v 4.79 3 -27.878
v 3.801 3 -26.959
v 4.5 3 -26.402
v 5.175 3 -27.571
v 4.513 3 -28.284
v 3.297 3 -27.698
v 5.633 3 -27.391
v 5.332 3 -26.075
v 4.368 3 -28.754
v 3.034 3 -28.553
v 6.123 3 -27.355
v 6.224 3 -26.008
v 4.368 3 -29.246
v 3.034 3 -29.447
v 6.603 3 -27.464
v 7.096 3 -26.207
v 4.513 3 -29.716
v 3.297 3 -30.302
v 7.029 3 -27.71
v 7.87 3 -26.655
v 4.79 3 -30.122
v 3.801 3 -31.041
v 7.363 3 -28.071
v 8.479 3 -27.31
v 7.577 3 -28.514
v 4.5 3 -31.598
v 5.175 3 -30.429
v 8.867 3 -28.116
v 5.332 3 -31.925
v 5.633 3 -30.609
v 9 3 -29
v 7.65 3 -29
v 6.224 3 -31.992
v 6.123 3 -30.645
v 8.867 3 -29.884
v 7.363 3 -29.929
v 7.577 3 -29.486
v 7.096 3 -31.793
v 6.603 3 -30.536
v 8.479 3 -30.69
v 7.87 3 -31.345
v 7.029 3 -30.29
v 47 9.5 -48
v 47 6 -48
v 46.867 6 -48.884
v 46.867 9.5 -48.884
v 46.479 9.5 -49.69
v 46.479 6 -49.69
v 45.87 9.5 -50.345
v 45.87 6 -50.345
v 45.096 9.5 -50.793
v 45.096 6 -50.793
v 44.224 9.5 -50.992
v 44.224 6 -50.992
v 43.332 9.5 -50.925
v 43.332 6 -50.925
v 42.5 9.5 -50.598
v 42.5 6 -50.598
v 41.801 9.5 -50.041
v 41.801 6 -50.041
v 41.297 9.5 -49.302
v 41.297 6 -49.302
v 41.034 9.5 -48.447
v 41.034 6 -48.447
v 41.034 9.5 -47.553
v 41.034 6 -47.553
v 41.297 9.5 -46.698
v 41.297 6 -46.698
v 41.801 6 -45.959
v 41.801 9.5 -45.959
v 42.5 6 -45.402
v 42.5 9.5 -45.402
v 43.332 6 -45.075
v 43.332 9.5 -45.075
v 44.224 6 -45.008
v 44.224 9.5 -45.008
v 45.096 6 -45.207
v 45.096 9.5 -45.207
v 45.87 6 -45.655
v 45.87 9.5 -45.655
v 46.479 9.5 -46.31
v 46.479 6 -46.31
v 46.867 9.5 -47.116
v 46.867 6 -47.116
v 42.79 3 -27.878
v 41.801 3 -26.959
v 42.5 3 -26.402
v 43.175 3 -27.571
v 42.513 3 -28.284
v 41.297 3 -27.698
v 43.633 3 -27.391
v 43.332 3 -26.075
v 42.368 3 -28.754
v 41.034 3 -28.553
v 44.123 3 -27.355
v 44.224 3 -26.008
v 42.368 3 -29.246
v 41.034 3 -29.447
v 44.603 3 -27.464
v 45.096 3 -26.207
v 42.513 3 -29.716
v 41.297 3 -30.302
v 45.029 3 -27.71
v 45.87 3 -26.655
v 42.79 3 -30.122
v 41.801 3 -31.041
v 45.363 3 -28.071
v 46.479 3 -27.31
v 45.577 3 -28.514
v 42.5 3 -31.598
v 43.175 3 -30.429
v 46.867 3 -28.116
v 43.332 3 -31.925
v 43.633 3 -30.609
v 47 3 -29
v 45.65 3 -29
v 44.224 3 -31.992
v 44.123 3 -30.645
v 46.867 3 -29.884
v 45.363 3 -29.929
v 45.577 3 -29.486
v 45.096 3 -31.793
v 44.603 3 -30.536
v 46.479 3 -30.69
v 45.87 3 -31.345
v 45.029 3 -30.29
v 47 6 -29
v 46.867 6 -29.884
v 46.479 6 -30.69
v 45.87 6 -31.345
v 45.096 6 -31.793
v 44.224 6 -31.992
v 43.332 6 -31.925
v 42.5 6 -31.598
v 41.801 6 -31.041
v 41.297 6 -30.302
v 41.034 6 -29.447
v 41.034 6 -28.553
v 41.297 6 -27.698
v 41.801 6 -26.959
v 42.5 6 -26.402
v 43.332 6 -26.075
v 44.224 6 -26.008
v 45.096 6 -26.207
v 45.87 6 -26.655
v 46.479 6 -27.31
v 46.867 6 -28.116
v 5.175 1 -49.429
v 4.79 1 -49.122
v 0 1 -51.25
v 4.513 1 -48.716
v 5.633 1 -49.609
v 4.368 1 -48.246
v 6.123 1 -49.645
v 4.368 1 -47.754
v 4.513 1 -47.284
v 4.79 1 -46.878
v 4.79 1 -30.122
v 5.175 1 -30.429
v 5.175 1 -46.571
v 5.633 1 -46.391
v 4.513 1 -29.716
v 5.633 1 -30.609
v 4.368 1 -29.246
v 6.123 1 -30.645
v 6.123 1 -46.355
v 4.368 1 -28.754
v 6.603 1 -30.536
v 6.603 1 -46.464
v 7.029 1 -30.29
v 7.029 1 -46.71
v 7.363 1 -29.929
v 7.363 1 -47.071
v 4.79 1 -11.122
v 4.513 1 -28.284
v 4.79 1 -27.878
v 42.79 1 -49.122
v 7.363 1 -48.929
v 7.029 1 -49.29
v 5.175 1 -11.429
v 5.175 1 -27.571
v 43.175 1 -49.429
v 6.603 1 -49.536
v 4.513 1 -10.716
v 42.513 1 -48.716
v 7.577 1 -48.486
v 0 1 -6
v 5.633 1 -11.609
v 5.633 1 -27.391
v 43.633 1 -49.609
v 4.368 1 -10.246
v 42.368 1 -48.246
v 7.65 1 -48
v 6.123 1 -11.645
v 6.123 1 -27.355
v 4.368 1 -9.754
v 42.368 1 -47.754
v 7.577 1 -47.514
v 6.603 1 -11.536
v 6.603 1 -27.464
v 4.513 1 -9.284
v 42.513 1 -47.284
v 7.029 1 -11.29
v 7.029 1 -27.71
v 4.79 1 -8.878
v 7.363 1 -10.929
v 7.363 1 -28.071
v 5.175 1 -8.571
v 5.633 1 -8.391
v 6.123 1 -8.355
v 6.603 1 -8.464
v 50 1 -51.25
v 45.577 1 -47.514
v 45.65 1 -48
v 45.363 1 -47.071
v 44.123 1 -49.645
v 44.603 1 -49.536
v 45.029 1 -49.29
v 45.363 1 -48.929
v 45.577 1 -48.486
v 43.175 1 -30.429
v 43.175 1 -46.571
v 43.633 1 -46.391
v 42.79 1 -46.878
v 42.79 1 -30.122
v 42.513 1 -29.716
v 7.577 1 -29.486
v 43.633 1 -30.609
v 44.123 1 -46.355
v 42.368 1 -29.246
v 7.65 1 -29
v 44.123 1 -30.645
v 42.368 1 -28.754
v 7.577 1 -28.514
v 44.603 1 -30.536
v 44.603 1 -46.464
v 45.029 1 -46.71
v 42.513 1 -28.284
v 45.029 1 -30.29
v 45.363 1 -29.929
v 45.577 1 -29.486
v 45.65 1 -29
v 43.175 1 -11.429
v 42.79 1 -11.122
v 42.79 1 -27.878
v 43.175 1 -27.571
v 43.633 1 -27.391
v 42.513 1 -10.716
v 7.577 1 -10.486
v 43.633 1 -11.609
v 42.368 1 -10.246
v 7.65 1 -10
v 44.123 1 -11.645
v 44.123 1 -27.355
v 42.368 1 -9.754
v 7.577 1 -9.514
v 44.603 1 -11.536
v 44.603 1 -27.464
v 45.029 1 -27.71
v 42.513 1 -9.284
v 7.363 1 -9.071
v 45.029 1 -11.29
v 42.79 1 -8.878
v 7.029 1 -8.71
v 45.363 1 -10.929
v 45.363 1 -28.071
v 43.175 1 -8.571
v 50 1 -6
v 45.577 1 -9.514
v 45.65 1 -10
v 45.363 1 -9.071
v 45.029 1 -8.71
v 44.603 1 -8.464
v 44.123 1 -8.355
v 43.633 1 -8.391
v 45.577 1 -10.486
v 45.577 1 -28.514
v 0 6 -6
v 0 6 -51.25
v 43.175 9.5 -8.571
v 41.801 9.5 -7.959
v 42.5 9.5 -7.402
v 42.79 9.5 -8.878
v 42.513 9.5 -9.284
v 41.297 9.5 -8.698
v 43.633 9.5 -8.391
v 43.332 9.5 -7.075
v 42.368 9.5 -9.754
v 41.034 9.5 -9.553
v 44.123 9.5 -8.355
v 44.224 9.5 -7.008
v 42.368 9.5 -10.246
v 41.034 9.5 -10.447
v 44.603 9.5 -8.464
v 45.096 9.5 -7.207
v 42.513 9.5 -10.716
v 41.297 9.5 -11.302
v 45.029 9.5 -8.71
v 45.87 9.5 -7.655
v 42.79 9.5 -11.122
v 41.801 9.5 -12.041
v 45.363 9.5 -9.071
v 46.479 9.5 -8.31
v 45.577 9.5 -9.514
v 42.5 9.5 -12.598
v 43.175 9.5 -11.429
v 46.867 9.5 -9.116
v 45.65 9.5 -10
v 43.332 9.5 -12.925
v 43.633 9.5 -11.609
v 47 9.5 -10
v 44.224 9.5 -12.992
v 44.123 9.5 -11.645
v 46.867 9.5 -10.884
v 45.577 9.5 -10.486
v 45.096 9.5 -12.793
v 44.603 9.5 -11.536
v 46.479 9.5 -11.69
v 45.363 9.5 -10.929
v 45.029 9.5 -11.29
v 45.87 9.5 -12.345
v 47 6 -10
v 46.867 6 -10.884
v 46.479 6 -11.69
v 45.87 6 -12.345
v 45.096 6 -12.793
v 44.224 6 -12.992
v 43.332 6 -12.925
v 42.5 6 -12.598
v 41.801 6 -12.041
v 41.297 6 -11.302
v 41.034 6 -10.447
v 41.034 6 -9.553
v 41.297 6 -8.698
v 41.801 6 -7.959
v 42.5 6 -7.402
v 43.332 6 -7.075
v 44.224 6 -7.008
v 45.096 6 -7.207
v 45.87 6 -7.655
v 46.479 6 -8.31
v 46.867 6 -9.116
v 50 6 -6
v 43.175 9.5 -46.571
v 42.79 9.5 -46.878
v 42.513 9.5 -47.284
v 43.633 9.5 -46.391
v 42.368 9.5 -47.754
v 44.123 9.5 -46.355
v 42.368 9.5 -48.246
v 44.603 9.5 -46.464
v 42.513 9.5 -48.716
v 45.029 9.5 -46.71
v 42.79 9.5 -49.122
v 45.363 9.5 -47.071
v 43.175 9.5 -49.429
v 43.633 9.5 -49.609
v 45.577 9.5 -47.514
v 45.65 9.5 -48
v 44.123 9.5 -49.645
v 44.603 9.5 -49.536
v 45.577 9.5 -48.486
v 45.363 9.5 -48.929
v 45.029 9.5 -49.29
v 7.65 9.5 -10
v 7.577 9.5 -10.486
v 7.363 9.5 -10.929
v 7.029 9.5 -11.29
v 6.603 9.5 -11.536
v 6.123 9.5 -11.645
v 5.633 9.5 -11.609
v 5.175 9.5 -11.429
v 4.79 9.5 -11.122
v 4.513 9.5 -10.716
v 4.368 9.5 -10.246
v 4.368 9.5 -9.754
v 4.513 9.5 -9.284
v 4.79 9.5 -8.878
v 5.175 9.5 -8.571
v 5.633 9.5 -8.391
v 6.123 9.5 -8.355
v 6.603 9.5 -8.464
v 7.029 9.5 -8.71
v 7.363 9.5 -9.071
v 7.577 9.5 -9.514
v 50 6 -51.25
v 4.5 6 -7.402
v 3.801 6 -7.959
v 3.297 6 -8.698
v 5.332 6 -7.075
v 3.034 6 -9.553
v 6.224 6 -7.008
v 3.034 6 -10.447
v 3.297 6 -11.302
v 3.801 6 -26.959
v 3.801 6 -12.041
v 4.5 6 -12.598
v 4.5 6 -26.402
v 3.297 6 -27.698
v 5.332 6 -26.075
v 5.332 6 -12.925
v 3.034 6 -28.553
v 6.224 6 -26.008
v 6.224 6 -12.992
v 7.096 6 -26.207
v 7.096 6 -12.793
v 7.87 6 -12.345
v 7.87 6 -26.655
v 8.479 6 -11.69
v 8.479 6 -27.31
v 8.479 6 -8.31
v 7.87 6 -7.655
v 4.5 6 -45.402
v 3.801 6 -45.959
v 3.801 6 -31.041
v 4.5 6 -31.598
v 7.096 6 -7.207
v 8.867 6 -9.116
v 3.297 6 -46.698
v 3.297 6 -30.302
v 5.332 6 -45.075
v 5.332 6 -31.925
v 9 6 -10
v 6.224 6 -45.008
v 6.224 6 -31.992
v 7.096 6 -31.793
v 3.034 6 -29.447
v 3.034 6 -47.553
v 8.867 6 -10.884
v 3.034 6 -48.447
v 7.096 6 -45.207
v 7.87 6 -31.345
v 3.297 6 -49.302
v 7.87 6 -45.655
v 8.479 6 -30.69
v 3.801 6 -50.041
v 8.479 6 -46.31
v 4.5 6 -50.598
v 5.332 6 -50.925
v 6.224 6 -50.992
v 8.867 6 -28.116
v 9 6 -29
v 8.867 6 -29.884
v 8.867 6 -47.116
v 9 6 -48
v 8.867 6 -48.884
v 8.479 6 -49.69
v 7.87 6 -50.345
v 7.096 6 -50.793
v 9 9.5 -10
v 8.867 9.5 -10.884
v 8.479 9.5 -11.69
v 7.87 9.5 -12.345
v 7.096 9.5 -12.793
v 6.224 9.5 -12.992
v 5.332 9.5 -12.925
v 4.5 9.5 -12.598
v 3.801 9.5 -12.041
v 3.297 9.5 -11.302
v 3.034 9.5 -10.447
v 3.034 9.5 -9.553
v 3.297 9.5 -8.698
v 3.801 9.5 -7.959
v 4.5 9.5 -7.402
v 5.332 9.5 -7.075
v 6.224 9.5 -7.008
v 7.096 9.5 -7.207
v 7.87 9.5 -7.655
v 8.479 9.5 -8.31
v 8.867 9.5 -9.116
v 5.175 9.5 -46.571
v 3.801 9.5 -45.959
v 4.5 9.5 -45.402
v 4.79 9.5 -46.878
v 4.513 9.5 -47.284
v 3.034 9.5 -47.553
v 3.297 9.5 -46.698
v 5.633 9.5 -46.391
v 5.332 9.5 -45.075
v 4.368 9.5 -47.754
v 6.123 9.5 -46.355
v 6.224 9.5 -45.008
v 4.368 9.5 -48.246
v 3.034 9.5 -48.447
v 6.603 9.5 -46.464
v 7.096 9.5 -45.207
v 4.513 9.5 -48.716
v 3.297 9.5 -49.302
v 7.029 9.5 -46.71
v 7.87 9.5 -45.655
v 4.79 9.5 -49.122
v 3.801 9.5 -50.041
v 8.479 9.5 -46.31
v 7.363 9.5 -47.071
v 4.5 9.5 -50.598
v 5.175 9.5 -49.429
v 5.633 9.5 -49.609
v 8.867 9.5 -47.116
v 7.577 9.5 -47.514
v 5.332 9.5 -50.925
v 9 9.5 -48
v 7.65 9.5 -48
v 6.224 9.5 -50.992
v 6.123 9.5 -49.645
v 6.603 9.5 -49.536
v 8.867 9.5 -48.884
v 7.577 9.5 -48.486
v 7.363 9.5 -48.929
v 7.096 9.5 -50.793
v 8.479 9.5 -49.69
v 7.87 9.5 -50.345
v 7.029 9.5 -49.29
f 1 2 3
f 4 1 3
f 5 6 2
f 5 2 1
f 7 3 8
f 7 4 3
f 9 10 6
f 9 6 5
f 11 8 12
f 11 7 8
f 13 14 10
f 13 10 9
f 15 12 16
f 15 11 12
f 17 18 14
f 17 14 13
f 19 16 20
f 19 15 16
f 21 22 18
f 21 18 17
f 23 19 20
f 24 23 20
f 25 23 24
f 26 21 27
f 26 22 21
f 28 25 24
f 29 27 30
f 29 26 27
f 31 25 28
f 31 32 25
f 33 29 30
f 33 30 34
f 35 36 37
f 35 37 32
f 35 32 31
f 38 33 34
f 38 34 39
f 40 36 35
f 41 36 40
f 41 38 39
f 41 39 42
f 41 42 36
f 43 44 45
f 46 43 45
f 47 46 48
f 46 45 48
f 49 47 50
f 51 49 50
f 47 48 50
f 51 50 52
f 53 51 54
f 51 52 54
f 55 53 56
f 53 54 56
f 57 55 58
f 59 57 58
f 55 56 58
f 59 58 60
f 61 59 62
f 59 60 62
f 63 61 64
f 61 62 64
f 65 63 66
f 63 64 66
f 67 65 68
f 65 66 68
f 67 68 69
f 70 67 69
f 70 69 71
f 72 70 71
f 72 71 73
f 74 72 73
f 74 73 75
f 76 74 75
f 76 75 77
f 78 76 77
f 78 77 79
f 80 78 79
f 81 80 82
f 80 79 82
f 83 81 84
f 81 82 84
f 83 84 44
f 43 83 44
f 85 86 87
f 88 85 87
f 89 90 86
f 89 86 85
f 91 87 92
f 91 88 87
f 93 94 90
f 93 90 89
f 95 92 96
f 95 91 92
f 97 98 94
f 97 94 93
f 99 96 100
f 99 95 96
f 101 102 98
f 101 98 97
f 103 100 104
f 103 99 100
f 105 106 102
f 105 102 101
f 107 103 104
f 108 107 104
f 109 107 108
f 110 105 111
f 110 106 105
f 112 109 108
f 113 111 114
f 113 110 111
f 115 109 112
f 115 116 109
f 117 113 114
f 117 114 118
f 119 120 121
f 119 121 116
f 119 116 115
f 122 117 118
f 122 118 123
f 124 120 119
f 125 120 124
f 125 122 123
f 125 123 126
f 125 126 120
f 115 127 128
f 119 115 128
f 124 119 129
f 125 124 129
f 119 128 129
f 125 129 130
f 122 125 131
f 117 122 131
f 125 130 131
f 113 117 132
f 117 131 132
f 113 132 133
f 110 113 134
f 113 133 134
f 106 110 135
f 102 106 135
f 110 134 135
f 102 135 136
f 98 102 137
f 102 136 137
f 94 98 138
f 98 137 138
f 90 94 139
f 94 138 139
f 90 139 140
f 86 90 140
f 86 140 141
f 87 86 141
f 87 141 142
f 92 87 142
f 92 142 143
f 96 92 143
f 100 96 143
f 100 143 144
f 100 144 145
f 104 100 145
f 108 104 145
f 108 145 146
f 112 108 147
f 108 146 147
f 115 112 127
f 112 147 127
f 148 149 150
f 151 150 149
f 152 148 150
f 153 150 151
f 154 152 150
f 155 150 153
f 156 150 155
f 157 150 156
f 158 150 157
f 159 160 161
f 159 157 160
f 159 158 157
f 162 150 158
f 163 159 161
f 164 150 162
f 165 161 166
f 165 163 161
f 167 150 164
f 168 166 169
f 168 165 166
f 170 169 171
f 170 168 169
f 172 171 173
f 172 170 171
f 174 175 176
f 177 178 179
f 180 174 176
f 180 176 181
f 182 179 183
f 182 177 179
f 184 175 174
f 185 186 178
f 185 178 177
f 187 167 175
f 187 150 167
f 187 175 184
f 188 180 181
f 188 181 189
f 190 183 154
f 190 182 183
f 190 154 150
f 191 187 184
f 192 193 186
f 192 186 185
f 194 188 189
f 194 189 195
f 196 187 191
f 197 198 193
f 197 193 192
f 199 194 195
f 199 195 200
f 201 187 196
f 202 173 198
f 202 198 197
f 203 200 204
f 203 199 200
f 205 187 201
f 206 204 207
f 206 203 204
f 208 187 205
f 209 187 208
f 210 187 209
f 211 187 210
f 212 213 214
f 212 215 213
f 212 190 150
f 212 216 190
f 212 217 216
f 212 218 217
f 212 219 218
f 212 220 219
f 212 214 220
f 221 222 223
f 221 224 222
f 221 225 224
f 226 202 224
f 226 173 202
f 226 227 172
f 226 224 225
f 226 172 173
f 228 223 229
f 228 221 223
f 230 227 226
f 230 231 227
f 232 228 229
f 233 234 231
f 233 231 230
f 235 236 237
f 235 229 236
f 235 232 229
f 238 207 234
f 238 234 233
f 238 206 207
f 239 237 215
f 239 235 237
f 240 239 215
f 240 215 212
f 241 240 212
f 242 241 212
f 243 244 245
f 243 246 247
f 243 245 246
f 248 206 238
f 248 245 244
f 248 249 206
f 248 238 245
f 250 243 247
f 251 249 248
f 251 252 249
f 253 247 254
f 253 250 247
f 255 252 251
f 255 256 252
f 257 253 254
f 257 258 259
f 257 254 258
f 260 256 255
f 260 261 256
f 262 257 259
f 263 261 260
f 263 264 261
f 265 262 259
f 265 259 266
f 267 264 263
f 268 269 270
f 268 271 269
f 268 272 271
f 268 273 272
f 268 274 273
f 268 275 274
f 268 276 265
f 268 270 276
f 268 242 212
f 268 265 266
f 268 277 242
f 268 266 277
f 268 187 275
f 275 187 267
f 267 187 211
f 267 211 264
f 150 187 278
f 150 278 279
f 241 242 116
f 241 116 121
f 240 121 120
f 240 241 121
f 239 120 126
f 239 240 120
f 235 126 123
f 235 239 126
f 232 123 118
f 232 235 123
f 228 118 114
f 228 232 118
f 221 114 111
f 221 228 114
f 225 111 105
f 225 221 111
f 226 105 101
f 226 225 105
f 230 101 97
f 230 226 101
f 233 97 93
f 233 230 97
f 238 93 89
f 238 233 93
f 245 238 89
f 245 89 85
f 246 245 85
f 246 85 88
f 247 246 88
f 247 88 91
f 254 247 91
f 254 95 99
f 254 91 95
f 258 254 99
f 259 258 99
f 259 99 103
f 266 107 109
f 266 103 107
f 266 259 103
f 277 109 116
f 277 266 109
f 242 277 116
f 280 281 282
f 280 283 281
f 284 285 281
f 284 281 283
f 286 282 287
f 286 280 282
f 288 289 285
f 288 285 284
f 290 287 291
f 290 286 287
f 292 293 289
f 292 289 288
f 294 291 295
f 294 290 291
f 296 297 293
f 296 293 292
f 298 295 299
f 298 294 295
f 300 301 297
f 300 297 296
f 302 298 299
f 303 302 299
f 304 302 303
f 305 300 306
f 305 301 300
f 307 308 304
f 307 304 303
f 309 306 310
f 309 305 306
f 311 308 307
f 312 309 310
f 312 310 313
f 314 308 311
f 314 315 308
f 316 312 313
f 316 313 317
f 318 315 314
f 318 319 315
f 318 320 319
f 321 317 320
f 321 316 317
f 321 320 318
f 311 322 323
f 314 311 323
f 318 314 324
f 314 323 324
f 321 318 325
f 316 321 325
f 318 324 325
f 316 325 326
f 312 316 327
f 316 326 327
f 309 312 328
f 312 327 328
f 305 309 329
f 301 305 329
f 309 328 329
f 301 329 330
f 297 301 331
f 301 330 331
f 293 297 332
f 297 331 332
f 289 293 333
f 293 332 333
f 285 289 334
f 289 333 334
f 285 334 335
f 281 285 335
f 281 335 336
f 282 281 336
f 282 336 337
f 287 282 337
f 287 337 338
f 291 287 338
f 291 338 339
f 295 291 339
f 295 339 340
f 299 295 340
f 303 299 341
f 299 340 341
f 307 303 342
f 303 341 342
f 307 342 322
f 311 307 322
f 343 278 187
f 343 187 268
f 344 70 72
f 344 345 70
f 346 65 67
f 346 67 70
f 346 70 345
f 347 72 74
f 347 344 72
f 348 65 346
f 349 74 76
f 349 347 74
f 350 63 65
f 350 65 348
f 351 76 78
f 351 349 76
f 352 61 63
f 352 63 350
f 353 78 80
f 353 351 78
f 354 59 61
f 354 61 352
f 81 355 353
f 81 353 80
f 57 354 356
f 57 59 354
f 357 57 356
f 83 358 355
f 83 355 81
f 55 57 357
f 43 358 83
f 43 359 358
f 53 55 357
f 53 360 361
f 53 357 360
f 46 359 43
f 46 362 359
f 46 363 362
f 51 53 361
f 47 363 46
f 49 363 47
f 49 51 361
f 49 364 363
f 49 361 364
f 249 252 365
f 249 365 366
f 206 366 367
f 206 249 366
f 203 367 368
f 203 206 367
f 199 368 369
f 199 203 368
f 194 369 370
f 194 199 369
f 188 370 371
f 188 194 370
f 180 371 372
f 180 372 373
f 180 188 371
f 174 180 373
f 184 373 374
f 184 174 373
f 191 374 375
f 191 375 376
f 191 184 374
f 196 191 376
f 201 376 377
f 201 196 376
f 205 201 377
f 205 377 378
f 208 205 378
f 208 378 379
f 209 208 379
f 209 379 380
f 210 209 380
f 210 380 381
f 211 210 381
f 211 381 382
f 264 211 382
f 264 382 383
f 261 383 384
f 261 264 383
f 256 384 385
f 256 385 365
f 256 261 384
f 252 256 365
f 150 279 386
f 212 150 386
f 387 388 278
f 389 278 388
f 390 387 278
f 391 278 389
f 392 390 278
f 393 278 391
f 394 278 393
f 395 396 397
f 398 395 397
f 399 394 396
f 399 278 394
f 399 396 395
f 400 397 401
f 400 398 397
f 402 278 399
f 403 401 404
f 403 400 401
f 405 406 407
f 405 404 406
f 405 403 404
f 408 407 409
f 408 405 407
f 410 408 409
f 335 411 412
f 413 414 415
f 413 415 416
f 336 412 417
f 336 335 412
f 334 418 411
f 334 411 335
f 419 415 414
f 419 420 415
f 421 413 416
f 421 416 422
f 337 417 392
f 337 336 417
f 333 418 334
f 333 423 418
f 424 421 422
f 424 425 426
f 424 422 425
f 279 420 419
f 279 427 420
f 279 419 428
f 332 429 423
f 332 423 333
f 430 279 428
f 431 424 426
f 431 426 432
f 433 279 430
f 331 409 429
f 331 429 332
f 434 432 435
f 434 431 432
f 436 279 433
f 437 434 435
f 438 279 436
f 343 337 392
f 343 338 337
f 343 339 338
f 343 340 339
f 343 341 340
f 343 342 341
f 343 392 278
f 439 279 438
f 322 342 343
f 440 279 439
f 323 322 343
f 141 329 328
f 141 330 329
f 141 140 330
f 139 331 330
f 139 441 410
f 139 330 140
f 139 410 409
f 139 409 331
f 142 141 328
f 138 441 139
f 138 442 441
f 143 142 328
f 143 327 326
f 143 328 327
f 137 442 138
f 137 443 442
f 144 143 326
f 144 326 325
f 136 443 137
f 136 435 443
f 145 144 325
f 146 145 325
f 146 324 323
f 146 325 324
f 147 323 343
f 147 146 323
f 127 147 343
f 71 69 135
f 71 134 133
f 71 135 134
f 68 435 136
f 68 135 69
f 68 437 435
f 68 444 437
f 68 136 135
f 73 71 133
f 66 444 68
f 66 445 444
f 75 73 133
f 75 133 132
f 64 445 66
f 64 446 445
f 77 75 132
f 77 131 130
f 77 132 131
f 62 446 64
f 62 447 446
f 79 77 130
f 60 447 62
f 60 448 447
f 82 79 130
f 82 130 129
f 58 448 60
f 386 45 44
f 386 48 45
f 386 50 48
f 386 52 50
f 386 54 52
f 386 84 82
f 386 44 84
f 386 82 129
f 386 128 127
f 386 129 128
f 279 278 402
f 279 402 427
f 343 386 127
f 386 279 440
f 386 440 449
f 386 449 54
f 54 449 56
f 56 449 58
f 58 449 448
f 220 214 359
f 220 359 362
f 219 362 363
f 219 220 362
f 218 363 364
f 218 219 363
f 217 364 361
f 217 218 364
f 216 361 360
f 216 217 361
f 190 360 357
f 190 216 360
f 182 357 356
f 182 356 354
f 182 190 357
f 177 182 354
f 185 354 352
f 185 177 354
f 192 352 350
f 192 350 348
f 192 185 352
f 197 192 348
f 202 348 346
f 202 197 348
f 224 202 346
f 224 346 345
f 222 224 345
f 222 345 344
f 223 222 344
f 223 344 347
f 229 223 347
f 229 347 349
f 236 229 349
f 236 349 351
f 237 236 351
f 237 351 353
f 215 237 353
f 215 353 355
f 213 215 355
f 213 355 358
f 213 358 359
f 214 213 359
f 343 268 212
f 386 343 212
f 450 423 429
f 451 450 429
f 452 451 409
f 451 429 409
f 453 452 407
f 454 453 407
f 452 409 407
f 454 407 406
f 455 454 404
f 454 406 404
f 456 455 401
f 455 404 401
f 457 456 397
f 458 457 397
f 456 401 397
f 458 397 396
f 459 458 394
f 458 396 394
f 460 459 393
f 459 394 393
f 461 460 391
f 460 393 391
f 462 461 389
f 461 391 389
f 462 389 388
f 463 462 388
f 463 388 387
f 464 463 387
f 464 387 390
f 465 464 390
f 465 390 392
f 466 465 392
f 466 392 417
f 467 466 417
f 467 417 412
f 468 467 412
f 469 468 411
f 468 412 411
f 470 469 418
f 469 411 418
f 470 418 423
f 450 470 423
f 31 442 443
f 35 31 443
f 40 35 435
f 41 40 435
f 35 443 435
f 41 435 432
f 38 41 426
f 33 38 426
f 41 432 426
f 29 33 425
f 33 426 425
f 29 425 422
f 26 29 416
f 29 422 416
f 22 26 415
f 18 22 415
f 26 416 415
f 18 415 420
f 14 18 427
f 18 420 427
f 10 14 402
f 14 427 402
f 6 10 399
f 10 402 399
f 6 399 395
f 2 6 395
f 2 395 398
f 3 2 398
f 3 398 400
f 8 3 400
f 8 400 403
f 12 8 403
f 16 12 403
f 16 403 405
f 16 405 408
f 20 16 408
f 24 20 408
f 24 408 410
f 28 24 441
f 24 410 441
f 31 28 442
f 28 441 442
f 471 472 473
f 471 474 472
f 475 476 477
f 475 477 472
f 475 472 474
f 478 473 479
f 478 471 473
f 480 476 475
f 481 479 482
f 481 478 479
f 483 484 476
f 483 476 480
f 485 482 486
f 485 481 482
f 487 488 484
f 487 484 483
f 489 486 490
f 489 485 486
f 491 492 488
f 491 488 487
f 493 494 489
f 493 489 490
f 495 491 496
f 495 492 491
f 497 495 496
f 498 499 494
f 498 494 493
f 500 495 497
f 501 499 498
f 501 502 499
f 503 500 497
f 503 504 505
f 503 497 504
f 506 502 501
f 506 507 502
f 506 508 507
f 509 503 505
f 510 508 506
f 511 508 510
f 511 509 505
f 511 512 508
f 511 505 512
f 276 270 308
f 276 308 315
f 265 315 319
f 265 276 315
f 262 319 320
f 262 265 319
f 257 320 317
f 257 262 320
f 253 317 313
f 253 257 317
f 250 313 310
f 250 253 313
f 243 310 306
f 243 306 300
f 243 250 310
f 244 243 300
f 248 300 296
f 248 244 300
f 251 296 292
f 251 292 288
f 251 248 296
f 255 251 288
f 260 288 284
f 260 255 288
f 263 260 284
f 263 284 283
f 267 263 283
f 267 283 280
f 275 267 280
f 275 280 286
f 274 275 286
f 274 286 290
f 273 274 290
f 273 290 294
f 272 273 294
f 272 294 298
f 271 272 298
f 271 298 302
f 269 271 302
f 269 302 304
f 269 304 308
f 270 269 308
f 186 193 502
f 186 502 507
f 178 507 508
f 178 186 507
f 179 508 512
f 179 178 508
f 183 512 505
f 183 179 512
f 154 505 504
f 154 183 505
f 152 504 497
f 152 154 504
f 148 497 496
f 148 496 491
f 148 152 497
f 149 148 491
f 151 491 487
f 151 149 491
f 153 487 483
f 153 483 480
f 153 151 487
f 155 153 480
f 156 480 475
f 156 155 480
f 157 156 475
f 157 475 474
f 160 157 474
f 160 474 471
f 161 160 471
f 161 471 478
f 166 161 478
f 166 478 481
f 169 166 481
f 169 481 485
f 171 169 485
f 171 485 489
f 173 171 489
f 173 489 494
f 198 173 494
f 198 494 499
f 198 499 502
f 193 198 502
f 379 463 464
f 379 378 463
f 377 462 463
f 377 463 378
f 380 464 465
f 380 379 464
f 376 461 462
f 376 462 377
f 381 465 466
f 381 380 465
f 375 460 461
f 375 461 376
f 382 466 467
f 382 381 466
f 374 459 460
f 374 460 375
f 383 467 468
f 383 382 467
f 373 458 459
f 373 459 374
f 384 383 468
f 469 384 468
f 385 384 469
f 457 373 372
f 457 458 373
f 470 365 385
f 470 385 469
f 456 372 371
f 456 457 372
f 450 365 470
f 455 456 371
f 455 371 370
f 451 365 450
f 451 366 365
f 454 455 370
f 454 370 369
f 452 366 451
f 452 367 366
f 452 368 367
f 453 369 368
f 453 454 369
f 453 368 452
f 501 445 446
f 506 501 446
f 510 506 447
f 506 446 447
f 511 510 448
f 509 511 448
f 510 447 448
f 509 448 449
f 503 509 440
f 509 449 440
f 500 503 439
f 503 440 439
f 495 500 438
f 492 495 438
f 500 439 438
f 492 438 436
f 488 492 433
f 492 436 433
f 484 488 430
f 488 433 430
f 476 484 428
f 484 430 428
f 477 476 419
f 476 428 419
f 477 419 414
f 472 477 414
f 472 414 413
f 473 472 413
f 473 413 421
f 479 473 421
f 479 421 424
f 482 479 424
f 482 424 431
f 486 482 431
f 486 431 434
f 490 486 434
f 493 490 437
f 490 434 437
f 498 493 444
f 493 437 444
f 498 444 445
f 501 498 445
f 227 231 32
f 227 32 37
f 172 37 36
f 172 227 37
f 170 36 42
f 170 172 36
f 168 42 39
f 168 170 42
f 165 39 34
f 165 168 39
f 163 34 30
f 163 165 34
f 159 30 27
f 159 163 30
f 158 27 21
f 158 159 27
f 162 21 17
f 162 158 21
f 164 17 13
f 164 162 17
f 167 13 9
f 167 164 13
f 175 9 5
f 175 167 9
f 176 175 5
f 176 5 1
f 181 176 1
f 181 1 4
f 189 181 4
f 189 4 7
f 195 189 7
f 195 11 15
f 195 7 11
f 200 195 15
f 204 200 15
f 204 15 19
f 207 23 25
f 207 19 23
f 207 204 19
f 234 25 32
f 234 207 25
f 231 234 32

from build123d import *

# Parameters (mm, degrees)
SKETCH2_W           = 50
SKETCH2_H           = 55
SKETCH2_R           = 1.65
BOSS_EXTRUDE2_DEPTH = 6
SKETCH4_R           = 3
SKETCH4_R_2         = 1.65
BOSS_EXTRUDE3_DEPTH = 3.5
SKETCH5_R           = 3
CUT_EXTRUDE2_DEPTH  = 3
SKETCH6_W           = 50
SKETCH6_H           = 3.75
SKETCH6_H_2         = 6
CUT_EXTRUDE3_DEPTH  = 10
SKETCH7_W           = 50
SKETCH7_H           = 45.25
CUT_EXTRUDE4_DEPTH  = 1


with BuildPart() as part:
    # Sketch2 → Boss-Extrude2 (new body)
    with BuildSketch(Plane(origin=(0, 0, 0), x_dir=(1, 0, 0), z_dir=(0, 1, 0))):
        with Locations((25, 27.5)):
            Rectangle(SKETCH2_W, SKETCH2_H)
        with Locations((6, 10)):
            Circle(SKETCH2_R, mode=Mode.SUBTRACT)
        with Locations((44, 10)):
            Circle(SKETCH2_R, mode=Mode.SUBTRACT)
        with Locations((44, 48)):
            Circle(SKETCH2_R, mode=Mode.SUBTRACT)
        with Locations((6, 48)):
            Circle(SKETCH2_R, mode=Mode.SUBTRACT)
        with Locations((6, 29)):
            Circle(SKETCH2_R, mode=Mode.SUBTRACT)
        with Locations((44, 29)):
            Circle(SKETCH2_R, mode=Mode.SUBTRACT)
    extrude(amount=BOSS_EXTRUDE2_DEPTH)

    # Sketch4 → Boss-Extrude3 (add)
    with BuildSketch(Plane(origin=(0, 6, 0), x_dir=(1, 0, 0), z_dir=(0, 1, 0))):
        with Locations((6, 10)):
            Circle(SKETCH4_R)
        with Locations((6, 10)):
            Circle(SKETCH4_R_2, mode=Mode.SUBTRACT)
        with Locations((44, 10)):
            Circle(SKETCH4_R)
        with Locations((44, 10)):
            Circle(SKETCH4_R_2, mode=Mode.SUBTRACT)
        with Locations((6, 48)):
            Circle(SKETCH4_R)
        with Locations((6, 48)):
            Circle(SKETCH4_R_2, mode=Mode.SUBTRACT)
        with Locations((44, 48)):
            Circle(SKETCH4_R)
        with Locations((44, 48)):
            Circle(SKETCH4_R_2, mode=Mode.SUBTRACT)
    extrude(amount=BOSS_EXTRUDE3_DEPTH)

    # Sketch5 → Cut-Extrude2 (cut)
    with BuildSketch(Plane(origin=(0, 6, 0), x_dir=(1, 0, 0), z_dir=(0, 1, 0))):
        with Locations((6, 29)):
            Circle(SKETCH5_R)
        with Locations((44, 29)):
            Circle(SKETCH5_R)
    extrude(amount=-CUT_EXTRUDE2_DEPTH, mode=Mode.SUBTRACT)

    # Sketch6 → Cut-Extrude3 (cut)
    with BuildSketch(Plane(origin=(0, 6, 0), x_dir=(1, 0, 0), z_dir=(0, 1, 0))):
        with Locations((25, 53.125)):
            Rectangle(SKETCH6_W, SKETCH6_H)
        with Locations((25, 3)):
            Rectangle(SKETCH6_W, SKETCH6_H_2)
    extrude(amount=-CUT_EXTRUDE3_DEPTH, mode=Mode.SUBTRACT)

    # Sketch7 → Cut-Extrude4 (cut)
    with BuildSketch(Plane.XZ):
        with Locations((25, -28.625)):
            Rectangle(SKETCH7_W, SKETCH7_H)
    extrude(amount=-CUT_EXTRUDE4_DEPTH, mode=Mode.SUBTRACT)


solid = part.part
